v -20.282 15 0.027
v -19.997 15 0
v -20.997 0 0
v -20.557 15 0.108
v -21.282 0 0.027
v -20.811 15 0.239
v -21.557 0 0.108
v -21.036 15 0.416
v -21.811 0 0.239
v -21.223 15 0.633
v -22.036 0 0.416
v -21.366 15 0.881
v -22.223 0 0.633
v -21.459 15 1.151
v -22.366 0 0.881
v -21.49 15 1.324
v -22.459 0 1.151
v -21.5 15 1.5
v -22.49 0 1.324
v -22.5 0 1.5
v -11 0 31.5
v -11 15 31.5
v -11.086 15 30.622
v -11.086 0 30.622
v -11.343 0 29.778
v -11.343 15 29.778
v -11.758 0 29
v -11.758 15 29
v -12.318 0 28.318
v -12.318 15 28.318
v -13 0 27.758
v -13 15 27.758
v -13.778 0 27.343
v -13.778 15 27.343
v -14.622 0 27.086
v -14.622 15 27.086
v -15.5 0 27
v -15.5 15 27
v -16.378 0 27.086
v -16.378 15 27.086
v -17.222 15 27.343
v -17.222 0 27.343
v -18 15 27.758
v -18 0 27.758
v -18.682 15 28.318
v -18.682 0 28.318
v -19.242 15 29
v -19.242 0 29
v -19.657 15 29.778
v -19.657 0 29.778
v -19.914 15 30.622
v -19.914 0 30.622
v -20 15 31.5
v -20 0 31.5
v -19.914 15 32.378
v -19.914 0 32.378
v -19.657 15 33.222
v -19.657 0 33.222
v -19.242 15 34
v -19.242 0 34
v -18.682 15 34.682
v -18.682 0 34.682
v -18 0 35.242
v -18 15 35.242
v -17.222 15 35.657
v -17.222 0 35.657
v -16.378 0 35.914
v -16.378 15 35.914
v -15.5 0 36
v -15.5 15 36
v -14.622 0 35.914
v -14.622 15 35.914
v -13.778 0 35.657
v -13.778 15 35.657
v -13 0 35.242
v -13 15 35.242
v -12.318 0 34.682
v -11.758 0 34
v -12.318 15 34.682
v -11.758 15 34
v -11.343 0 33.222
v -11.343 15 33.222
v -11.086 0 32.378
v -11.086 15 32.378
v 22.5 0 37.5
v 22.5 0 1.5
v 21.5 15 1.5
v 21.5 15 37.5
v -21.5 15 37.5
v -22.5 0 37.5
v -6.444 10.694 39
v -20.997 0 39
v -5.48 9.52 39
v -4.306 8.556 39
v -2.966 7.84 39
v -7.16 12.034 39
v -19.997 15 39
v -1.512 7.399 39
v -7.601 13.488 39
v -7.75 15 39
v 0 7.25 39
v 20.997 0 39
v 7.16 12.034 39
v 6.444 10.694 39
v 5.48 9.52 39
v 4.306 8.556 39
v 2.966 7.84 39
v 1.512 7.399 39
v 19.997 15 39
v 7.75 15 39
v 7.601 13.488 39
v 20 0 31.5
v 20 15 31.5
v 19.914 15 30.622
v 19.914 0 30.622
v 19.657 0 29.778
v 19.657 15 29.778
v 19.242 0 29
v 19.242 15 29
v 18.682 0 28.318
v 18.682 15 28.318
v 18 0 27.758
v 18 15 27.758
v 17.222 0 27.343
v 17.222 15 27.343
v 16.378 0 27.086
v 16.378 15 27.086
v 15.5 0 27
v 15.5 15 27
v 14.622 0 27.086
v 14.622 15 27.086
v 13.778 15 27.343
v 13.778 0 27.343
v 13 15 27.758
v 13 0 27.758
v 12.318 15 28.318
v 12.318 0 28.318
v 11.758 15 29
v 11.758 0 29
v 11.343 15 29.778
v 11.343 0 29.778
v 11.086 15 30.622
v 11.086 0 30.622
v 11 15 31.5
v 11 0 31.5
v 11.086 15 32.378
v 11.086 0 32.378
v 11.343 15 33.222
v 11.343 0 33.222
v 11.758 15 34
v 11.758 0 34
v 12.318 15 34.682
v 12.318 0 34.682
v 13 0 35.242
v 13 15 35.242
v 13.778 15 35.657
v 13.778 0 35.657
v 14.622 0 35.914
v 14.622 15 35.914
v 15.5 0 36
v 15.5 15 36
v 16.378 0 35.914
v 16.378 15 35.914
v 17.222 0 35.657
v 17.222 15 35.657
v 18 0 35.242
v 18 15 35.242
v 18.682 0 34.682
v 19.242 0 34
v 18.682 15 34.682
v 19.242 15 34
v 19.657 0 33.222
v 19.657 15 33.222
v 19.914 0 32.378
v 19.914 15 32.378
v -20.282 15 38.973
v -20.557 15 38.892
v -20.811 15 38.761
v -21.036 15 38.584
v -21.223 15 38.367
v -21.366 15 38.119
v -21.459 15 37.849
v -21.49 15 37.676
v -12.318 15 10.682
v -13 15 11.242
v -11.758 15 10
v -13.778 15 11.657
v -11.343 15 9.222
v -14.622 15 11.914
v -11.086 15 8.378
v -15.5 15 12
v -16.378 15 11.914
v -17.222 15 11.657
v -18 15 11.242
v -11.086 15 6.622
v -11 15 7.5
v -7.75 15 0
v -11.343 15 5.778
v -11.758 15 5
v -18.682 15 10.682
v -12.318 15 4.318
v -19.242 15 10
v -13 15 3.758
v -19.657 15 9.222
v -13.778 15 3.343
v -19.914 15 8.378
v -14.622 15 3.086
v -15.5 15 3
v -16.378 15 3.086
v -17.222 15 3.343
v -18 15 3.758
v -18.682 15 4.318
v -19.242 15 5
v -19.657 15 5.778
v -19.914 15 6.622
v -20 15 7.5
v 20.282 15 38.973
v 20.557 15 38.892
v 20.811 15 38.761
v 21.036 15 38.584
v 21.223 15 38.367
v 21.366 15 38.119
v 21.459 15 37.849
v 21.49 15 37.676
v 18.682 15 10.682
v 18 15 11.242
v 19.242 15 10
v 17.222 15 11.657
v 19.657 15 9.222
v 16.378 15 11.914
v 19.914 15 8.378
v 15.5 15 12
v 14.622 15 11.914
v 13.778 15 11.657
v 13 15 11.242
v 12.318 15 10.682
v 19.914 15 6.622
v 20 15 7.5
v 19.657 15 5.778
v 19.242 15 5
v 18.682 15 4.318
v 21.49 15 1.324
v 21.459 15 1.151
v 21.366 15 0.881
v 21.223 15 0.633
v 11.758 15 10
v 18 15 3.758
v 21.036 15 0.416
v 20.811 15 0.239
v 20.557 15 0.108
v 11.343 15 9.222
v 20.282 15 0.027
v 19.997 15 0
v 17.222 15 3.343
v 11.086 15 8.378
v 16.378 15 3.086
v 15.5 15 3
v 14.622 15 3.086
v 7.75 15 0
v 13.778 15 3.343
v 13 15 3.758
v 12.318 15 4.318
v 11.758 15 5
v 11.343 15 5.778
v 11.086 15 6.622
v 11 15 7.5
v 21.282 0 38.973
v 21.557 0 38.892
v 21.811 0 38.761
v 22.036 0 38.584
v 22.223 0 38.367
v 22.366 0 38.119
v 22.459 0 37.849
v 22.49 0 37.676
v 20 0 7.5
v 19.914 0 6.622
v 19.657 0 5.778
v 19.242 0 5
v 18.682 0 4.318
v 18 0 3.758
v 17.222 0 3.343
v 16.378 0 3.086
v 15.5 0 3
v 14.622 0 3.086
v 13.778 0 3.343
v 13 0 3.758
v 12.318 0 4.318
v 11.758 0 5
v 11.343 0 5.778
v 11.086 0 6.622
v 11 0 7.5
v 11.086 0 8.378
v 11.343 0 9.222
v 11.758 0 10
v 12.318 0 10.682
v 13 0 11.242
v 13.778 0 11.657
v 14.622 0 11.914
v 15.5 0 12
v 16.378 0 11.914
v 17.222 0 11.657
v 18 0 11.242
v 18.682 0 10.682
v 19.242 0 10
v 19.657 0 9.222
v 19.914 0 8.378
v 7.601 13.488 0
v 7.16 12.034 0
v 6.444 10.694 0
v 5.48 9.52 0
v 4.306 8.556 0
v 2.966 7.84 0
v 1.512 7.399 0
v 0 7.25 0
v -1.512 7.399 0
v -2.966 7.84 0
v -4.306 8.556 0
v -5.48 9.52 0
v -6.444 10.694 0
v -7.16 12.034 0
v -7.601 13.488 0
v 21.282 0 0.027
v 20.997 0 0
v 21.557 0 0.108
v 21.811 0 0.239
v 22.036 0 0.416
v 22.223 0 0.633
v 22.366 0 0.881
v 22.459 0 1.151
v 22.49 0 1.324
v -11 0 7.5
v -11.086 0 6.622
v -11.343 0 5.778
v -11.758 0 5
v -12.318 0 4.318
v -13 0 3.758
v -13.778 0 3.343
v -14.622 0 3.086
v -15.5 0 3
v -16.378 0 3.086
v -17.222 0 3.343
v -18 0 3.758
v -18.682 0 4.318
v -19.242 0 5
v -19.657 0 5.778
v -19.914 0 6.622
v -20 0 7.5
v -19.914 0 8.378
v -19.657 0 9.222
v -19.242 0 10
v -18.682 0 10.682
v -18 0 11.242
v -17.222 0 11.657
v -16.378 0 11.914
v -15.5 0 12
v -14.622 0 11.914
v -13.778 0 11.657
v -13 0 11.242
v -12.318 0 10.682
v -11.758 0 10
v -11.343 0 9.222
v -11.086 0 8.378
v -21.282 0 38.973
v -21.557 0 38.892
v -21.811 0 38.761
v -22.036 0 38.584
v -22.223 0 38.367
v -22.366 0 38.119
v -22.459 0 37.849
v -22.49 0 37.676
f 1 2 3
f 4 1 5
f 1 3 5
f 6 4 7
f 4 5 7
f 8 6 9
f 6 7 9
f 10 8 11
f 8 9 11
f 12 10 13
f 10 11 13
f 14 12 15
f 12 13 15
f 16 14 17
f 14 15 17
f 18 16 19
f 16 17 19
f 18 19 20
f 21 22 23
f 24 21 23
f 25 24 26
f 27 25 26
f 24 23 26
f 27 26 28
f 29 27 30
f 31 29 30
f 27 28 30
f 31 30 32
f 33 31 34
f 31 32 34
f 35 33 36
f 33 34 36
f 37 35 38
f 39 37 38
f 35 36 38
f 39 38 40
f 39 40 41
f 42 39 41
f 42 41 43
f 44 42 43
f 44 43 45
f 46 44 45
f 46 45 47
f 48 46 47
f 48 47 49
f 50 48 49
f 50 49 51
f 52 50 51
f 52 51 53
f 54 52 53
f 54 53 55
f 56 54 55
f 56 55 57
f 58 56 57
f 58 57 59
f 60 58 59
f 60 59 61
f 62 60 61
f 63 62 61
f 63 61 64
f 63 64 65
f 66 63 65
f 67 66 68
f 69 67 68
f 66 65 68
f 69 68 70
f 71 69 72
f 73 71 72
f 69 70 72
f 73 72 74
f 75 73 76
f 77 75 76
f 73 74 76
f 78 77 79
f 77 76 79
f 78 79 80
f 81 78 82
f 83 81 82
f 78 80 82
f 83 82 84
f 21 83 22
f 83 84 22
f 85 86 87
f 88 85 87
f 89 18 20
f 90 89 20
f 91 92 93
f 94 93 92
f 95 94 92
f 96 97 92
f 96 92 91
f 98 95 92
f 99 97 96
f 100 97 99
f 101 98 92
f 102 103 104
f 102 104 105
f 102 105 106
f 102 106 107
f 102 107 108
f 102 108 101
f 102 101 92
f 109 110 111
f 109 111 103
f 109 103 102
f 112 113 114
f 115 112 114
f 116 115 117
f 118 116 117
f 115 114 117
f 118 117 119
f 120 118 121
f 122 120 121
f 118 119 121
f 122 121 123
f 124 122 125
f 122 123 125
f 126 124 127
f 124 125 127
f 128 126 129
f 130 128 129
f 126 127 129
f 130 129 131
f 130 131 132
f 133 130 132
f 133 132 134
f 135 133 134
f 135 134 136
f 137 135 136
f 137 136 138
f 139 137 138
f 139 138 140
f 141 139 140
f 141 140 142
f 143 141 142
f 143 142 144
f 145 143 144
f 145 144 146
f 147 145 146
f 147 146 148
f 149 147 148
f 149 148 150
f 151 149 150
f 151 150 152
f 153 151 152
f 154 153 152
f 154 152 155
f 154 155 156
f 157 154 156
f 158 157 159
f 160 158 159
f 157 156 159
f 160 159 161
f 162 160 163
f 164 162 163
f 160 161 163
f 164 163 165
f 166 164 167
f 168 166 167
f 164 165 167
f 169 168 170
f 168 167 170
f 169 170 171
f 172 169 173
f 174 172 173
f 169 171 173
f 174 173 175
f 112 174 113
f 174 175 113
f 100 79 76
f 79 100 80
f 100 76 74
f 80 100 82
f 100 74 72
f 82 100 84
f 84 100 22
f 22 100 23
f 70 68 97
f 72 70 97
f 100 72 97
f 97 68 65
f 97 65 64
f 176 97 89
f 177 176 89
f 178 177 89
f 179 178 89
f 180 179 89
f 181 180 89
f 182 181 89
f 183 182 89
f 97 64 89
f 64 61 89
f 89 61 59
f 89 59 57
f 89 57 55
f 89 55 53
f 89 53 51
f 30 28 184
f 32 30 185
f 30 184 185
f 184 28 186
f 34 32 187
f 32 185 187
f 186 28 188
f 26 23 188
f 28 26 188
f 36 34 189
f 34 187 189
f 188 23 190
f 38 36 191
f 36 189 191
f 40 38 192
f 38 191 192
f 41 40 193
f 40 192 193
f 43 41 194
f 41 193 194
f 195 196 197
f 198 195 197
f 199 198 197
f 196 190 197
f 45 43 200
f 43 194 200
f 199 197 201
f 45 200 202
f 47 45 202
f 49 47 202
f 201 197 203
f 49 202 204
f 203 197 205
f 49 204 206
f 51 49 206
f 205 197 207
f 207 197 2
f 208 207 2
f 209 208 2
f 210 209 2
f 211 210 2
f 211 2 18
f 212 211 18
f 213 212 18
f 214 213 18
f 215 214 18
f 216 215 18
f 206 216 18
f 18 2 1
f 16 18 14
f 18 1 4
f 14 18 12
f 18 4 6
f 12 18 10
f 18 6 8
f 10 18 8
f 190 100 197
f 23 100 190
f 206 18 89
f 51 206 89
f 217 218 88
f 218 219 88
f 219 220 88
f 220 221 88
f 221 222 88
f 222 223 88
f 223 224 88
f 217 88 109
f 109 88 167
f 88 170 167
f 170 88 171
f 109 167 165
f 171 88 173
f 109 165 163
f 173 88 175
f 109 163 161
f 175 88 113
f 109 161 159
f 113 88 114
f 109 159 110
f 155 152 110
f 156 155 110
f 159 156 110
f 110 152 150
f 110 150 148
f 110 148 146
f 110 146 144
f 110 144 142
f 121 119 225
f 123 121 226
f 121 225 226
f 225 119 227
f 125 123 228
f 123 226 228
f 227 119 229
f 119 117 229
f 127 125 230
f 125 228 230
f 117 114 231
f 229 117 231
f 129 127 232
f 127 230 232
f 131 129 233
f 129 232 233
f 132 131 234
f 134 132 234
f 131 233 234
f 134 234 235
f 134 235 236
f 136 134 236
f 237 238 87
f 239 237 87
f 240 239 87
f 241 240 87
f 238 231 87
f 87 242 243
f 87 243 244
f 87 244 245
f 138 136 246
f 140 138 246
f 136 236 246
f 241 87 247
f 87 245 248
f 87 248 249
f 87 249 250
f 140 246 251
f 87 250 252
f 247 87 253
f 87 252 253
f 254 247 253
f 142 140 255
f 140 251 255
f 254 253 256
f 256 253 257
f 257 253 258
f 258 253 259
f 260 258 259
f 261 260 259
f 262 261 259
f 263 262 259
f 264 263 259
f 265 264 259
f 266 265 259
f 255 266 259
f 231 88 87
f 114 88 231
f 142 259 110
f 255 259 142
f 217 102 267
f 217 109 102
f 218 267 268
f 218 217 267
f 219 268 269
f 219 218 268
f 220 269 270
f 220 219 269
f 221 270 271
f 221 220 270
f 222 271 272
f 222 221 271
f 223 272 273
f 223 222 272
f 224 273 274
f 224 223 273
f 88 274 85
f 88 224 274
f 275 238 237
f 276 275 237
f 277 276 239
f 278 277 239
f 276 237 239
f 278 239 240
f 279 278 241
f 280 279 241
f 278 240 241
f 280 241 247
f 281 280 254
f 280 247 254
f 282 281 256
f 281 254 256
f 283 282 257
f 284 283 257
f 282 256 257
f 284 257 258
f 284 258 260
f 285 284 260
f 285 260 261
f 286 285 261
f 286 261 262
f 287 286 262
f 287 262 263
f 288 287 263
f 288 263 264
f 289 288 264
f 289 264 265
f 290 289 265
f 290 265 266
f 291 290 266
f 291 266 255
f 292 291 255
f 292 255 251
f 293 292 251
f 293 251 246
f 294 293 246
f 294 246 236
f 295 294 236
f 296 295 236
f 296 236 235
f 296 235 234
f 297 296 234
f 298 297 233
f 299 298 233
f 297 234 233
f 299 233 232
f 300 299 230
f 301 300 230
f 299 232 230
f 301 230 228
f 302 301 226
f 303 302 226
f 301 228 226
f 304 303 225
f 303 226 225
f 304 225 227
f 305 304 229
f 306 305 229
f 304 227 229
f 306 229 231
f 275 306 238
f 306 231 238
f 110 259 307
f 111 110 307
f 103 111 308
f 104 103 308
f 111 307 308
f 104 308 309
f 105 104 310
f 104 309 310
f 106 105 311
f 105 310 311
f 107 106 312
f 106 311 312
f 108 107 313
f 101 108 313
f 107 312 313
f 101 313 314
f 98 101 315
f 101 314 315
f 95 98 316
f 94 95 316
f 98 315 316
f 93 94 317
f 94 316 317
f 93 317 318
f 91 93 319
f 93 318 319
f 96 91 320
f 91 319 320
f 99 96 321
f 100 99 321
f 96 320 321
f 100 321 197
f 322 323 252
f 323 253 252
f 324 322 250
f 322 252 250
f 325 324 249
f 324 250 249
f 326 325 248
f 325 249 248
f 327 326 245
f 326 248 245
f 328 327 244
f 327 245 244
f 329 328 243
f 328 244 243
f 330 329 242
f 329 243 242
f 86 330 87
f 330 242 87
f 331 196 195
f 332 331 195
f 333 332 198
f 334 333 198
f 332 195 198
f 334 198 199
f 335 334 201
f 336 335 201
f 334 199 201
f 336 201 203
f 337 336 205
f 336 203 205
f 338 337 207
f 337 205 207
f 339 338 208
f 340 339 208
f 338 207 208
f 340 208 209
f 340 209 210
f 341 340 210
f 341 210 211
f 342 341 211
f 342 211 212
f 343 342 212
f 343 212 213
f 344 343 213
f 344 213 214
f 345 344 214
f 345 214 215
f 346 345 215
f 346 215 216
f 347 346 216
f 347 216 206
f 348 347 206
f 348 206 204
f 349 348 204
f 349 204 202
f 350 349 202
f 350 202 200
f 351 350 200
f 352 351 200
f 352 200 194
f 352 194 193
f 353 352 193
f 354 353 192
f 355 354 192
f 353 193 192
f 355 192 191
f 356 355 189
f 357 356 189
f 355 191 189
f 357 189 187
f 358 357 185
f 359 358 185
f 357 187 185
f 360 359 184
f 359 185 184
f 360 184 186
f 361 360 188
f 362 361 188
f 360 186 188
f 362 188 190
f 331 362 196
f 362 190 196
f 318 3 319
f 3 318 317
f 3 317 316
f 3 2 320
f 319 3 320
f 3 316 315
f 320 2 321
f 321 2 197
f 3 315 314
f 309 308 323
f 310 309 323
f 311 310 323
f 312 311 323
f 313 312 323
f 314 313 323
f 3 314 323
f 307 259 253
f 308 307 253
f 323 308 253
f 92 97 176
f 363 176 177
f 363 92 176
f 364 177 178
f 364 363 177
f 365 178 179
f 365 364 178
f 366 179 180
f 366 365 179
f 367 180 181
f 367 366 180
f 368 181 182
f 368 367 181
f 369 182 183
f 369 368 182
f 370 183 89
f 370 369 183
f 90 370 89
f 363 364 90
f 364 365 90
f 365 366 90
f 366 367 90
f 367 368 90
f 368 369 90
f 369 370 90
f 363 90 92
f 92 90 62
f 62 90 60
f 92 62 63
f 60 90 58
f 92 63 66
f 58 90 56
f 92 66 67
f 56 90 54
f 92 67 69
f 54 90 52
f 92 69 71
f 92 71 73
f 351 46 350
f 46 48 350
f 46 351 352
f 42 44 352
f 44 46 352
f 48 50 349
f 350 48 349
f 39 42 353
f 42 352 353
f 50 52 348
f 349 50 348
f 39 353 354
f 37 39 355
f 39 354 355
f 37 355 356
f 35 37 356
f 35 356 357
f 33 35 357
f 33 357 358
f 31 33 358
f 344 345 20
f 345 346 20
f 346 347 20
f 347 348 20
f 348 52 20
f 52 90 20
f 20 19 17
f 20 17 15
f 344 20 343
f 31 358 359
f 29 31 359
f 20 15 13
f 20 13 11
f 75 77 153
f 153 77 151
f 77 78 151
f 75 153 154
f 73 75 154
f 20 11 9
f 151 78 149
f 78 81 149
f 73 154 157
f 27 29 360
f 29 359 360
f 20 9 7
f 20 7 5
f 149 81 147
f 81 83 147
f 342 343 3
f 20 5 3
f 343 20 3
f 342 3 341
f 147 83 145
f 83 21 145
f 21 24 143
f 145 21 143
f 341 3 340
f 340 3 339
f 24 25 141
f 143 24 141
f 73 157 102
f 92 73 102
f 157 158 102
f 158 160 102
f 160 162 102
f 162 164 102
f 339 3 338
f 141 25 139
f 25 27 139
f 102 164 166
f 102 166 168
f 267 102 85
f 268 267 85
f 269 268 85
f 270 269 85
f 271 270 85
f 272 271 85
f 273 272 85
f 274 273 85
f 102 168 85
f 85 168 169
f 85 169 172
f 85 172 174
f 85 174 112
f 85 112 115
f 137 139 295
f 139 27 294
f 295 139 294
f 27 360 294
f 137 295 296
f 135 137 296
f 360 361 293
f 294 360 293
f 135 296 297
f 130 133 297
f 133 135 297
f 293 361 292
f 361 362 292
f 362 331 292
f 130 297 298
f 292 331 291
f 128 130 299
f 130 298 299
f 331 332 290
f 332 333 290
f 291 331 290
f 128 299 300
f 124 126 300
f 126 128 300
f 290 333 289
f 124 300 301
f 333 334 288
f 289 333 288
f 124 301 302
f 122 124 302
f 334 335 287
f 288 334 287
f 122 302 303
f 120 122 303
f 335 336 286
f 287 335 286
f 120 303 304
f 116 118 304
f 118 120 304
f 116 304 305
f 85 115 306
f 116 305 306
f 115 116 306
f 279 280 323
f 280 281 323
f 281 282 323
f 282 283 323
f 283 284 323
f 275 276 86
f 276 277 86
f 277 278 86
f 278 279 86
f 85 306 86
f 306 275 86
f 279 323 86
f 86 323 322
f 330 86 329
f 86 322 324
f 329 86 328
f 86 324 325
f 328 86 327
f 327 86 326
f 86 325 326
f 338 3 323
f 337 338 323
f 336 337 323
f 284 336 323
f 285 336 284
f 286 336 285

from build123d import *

# Parameters (mm, degrees)
ESTRUSIONE_ESTRUSIONE1_DEPTH = 39
FORO_PER_VITE_M8_1_D         = 9
FORO_PER_VITE_M8_1_DEPTH     = 30
FORO_PER_VITE_M8_1_TIP       = 2.703872786
RACCORDO1_R                  = 1.5


with BuildPart() as part:
    # Schizzo1 → Estrusione-Estrusione1 (new body)
    with BuildSketch(Plane.XY):
        with BuildLine():
            Line((-7.75, 15), (-21.5, 15))
            Line((-21.5, 15), (-22.5, 0))
            Line((-22.5, 0), (22.5, 0))
            Line((22.5, 0), (21.5, 15))
            Line((21.5, 15), (7.75, 15))
            ThreePointArc((7.75, 15), (0, 7.25), (-7.75, 15))
        make_face()
    extrude(amount=ESTRUSIONE_ESTRUSIONE1_DEPTH)

    # Foro per Vite M8-1
    with Locations(Plane(origin=(0, 0, 0), x_dir=(-1, 0, 0), z_dir=(0, -1, 0))):
        with Locations((-15.5, -7.5), (15.5, -7.5), (15.5, -31.5), (-15.5, -31.5)):
            Hole(FORO_PER_VITE_M8_1_D / 2, depth=FORO_PER_VITE_M8_1_DEPTH)
            with Locations((0, 0, -(FORO_PER_VITE_M8_1_DEPTH + FORO_PER_VITE_M8_1_TIP / 2))):  # 118° drill point
                Cone(0, FORO_PER_VITE_M8_1_D / 2, FORO_PER_VITE_M8_1_TIP, mode=Mode.SUBTRACT)

    # Raccordo1
    raccordo1_edges = [part.edges().sort_by_distance(p)[0] for p in [
        (-22, 7.5, 39),
        (22, 7.5, 39),
        (22, 7.5, 0),
        (-22, 7.5, 0),
    ]]
    fillet(raccordo1_edges, radius=RACCORDO1_R)


solid = part.part
